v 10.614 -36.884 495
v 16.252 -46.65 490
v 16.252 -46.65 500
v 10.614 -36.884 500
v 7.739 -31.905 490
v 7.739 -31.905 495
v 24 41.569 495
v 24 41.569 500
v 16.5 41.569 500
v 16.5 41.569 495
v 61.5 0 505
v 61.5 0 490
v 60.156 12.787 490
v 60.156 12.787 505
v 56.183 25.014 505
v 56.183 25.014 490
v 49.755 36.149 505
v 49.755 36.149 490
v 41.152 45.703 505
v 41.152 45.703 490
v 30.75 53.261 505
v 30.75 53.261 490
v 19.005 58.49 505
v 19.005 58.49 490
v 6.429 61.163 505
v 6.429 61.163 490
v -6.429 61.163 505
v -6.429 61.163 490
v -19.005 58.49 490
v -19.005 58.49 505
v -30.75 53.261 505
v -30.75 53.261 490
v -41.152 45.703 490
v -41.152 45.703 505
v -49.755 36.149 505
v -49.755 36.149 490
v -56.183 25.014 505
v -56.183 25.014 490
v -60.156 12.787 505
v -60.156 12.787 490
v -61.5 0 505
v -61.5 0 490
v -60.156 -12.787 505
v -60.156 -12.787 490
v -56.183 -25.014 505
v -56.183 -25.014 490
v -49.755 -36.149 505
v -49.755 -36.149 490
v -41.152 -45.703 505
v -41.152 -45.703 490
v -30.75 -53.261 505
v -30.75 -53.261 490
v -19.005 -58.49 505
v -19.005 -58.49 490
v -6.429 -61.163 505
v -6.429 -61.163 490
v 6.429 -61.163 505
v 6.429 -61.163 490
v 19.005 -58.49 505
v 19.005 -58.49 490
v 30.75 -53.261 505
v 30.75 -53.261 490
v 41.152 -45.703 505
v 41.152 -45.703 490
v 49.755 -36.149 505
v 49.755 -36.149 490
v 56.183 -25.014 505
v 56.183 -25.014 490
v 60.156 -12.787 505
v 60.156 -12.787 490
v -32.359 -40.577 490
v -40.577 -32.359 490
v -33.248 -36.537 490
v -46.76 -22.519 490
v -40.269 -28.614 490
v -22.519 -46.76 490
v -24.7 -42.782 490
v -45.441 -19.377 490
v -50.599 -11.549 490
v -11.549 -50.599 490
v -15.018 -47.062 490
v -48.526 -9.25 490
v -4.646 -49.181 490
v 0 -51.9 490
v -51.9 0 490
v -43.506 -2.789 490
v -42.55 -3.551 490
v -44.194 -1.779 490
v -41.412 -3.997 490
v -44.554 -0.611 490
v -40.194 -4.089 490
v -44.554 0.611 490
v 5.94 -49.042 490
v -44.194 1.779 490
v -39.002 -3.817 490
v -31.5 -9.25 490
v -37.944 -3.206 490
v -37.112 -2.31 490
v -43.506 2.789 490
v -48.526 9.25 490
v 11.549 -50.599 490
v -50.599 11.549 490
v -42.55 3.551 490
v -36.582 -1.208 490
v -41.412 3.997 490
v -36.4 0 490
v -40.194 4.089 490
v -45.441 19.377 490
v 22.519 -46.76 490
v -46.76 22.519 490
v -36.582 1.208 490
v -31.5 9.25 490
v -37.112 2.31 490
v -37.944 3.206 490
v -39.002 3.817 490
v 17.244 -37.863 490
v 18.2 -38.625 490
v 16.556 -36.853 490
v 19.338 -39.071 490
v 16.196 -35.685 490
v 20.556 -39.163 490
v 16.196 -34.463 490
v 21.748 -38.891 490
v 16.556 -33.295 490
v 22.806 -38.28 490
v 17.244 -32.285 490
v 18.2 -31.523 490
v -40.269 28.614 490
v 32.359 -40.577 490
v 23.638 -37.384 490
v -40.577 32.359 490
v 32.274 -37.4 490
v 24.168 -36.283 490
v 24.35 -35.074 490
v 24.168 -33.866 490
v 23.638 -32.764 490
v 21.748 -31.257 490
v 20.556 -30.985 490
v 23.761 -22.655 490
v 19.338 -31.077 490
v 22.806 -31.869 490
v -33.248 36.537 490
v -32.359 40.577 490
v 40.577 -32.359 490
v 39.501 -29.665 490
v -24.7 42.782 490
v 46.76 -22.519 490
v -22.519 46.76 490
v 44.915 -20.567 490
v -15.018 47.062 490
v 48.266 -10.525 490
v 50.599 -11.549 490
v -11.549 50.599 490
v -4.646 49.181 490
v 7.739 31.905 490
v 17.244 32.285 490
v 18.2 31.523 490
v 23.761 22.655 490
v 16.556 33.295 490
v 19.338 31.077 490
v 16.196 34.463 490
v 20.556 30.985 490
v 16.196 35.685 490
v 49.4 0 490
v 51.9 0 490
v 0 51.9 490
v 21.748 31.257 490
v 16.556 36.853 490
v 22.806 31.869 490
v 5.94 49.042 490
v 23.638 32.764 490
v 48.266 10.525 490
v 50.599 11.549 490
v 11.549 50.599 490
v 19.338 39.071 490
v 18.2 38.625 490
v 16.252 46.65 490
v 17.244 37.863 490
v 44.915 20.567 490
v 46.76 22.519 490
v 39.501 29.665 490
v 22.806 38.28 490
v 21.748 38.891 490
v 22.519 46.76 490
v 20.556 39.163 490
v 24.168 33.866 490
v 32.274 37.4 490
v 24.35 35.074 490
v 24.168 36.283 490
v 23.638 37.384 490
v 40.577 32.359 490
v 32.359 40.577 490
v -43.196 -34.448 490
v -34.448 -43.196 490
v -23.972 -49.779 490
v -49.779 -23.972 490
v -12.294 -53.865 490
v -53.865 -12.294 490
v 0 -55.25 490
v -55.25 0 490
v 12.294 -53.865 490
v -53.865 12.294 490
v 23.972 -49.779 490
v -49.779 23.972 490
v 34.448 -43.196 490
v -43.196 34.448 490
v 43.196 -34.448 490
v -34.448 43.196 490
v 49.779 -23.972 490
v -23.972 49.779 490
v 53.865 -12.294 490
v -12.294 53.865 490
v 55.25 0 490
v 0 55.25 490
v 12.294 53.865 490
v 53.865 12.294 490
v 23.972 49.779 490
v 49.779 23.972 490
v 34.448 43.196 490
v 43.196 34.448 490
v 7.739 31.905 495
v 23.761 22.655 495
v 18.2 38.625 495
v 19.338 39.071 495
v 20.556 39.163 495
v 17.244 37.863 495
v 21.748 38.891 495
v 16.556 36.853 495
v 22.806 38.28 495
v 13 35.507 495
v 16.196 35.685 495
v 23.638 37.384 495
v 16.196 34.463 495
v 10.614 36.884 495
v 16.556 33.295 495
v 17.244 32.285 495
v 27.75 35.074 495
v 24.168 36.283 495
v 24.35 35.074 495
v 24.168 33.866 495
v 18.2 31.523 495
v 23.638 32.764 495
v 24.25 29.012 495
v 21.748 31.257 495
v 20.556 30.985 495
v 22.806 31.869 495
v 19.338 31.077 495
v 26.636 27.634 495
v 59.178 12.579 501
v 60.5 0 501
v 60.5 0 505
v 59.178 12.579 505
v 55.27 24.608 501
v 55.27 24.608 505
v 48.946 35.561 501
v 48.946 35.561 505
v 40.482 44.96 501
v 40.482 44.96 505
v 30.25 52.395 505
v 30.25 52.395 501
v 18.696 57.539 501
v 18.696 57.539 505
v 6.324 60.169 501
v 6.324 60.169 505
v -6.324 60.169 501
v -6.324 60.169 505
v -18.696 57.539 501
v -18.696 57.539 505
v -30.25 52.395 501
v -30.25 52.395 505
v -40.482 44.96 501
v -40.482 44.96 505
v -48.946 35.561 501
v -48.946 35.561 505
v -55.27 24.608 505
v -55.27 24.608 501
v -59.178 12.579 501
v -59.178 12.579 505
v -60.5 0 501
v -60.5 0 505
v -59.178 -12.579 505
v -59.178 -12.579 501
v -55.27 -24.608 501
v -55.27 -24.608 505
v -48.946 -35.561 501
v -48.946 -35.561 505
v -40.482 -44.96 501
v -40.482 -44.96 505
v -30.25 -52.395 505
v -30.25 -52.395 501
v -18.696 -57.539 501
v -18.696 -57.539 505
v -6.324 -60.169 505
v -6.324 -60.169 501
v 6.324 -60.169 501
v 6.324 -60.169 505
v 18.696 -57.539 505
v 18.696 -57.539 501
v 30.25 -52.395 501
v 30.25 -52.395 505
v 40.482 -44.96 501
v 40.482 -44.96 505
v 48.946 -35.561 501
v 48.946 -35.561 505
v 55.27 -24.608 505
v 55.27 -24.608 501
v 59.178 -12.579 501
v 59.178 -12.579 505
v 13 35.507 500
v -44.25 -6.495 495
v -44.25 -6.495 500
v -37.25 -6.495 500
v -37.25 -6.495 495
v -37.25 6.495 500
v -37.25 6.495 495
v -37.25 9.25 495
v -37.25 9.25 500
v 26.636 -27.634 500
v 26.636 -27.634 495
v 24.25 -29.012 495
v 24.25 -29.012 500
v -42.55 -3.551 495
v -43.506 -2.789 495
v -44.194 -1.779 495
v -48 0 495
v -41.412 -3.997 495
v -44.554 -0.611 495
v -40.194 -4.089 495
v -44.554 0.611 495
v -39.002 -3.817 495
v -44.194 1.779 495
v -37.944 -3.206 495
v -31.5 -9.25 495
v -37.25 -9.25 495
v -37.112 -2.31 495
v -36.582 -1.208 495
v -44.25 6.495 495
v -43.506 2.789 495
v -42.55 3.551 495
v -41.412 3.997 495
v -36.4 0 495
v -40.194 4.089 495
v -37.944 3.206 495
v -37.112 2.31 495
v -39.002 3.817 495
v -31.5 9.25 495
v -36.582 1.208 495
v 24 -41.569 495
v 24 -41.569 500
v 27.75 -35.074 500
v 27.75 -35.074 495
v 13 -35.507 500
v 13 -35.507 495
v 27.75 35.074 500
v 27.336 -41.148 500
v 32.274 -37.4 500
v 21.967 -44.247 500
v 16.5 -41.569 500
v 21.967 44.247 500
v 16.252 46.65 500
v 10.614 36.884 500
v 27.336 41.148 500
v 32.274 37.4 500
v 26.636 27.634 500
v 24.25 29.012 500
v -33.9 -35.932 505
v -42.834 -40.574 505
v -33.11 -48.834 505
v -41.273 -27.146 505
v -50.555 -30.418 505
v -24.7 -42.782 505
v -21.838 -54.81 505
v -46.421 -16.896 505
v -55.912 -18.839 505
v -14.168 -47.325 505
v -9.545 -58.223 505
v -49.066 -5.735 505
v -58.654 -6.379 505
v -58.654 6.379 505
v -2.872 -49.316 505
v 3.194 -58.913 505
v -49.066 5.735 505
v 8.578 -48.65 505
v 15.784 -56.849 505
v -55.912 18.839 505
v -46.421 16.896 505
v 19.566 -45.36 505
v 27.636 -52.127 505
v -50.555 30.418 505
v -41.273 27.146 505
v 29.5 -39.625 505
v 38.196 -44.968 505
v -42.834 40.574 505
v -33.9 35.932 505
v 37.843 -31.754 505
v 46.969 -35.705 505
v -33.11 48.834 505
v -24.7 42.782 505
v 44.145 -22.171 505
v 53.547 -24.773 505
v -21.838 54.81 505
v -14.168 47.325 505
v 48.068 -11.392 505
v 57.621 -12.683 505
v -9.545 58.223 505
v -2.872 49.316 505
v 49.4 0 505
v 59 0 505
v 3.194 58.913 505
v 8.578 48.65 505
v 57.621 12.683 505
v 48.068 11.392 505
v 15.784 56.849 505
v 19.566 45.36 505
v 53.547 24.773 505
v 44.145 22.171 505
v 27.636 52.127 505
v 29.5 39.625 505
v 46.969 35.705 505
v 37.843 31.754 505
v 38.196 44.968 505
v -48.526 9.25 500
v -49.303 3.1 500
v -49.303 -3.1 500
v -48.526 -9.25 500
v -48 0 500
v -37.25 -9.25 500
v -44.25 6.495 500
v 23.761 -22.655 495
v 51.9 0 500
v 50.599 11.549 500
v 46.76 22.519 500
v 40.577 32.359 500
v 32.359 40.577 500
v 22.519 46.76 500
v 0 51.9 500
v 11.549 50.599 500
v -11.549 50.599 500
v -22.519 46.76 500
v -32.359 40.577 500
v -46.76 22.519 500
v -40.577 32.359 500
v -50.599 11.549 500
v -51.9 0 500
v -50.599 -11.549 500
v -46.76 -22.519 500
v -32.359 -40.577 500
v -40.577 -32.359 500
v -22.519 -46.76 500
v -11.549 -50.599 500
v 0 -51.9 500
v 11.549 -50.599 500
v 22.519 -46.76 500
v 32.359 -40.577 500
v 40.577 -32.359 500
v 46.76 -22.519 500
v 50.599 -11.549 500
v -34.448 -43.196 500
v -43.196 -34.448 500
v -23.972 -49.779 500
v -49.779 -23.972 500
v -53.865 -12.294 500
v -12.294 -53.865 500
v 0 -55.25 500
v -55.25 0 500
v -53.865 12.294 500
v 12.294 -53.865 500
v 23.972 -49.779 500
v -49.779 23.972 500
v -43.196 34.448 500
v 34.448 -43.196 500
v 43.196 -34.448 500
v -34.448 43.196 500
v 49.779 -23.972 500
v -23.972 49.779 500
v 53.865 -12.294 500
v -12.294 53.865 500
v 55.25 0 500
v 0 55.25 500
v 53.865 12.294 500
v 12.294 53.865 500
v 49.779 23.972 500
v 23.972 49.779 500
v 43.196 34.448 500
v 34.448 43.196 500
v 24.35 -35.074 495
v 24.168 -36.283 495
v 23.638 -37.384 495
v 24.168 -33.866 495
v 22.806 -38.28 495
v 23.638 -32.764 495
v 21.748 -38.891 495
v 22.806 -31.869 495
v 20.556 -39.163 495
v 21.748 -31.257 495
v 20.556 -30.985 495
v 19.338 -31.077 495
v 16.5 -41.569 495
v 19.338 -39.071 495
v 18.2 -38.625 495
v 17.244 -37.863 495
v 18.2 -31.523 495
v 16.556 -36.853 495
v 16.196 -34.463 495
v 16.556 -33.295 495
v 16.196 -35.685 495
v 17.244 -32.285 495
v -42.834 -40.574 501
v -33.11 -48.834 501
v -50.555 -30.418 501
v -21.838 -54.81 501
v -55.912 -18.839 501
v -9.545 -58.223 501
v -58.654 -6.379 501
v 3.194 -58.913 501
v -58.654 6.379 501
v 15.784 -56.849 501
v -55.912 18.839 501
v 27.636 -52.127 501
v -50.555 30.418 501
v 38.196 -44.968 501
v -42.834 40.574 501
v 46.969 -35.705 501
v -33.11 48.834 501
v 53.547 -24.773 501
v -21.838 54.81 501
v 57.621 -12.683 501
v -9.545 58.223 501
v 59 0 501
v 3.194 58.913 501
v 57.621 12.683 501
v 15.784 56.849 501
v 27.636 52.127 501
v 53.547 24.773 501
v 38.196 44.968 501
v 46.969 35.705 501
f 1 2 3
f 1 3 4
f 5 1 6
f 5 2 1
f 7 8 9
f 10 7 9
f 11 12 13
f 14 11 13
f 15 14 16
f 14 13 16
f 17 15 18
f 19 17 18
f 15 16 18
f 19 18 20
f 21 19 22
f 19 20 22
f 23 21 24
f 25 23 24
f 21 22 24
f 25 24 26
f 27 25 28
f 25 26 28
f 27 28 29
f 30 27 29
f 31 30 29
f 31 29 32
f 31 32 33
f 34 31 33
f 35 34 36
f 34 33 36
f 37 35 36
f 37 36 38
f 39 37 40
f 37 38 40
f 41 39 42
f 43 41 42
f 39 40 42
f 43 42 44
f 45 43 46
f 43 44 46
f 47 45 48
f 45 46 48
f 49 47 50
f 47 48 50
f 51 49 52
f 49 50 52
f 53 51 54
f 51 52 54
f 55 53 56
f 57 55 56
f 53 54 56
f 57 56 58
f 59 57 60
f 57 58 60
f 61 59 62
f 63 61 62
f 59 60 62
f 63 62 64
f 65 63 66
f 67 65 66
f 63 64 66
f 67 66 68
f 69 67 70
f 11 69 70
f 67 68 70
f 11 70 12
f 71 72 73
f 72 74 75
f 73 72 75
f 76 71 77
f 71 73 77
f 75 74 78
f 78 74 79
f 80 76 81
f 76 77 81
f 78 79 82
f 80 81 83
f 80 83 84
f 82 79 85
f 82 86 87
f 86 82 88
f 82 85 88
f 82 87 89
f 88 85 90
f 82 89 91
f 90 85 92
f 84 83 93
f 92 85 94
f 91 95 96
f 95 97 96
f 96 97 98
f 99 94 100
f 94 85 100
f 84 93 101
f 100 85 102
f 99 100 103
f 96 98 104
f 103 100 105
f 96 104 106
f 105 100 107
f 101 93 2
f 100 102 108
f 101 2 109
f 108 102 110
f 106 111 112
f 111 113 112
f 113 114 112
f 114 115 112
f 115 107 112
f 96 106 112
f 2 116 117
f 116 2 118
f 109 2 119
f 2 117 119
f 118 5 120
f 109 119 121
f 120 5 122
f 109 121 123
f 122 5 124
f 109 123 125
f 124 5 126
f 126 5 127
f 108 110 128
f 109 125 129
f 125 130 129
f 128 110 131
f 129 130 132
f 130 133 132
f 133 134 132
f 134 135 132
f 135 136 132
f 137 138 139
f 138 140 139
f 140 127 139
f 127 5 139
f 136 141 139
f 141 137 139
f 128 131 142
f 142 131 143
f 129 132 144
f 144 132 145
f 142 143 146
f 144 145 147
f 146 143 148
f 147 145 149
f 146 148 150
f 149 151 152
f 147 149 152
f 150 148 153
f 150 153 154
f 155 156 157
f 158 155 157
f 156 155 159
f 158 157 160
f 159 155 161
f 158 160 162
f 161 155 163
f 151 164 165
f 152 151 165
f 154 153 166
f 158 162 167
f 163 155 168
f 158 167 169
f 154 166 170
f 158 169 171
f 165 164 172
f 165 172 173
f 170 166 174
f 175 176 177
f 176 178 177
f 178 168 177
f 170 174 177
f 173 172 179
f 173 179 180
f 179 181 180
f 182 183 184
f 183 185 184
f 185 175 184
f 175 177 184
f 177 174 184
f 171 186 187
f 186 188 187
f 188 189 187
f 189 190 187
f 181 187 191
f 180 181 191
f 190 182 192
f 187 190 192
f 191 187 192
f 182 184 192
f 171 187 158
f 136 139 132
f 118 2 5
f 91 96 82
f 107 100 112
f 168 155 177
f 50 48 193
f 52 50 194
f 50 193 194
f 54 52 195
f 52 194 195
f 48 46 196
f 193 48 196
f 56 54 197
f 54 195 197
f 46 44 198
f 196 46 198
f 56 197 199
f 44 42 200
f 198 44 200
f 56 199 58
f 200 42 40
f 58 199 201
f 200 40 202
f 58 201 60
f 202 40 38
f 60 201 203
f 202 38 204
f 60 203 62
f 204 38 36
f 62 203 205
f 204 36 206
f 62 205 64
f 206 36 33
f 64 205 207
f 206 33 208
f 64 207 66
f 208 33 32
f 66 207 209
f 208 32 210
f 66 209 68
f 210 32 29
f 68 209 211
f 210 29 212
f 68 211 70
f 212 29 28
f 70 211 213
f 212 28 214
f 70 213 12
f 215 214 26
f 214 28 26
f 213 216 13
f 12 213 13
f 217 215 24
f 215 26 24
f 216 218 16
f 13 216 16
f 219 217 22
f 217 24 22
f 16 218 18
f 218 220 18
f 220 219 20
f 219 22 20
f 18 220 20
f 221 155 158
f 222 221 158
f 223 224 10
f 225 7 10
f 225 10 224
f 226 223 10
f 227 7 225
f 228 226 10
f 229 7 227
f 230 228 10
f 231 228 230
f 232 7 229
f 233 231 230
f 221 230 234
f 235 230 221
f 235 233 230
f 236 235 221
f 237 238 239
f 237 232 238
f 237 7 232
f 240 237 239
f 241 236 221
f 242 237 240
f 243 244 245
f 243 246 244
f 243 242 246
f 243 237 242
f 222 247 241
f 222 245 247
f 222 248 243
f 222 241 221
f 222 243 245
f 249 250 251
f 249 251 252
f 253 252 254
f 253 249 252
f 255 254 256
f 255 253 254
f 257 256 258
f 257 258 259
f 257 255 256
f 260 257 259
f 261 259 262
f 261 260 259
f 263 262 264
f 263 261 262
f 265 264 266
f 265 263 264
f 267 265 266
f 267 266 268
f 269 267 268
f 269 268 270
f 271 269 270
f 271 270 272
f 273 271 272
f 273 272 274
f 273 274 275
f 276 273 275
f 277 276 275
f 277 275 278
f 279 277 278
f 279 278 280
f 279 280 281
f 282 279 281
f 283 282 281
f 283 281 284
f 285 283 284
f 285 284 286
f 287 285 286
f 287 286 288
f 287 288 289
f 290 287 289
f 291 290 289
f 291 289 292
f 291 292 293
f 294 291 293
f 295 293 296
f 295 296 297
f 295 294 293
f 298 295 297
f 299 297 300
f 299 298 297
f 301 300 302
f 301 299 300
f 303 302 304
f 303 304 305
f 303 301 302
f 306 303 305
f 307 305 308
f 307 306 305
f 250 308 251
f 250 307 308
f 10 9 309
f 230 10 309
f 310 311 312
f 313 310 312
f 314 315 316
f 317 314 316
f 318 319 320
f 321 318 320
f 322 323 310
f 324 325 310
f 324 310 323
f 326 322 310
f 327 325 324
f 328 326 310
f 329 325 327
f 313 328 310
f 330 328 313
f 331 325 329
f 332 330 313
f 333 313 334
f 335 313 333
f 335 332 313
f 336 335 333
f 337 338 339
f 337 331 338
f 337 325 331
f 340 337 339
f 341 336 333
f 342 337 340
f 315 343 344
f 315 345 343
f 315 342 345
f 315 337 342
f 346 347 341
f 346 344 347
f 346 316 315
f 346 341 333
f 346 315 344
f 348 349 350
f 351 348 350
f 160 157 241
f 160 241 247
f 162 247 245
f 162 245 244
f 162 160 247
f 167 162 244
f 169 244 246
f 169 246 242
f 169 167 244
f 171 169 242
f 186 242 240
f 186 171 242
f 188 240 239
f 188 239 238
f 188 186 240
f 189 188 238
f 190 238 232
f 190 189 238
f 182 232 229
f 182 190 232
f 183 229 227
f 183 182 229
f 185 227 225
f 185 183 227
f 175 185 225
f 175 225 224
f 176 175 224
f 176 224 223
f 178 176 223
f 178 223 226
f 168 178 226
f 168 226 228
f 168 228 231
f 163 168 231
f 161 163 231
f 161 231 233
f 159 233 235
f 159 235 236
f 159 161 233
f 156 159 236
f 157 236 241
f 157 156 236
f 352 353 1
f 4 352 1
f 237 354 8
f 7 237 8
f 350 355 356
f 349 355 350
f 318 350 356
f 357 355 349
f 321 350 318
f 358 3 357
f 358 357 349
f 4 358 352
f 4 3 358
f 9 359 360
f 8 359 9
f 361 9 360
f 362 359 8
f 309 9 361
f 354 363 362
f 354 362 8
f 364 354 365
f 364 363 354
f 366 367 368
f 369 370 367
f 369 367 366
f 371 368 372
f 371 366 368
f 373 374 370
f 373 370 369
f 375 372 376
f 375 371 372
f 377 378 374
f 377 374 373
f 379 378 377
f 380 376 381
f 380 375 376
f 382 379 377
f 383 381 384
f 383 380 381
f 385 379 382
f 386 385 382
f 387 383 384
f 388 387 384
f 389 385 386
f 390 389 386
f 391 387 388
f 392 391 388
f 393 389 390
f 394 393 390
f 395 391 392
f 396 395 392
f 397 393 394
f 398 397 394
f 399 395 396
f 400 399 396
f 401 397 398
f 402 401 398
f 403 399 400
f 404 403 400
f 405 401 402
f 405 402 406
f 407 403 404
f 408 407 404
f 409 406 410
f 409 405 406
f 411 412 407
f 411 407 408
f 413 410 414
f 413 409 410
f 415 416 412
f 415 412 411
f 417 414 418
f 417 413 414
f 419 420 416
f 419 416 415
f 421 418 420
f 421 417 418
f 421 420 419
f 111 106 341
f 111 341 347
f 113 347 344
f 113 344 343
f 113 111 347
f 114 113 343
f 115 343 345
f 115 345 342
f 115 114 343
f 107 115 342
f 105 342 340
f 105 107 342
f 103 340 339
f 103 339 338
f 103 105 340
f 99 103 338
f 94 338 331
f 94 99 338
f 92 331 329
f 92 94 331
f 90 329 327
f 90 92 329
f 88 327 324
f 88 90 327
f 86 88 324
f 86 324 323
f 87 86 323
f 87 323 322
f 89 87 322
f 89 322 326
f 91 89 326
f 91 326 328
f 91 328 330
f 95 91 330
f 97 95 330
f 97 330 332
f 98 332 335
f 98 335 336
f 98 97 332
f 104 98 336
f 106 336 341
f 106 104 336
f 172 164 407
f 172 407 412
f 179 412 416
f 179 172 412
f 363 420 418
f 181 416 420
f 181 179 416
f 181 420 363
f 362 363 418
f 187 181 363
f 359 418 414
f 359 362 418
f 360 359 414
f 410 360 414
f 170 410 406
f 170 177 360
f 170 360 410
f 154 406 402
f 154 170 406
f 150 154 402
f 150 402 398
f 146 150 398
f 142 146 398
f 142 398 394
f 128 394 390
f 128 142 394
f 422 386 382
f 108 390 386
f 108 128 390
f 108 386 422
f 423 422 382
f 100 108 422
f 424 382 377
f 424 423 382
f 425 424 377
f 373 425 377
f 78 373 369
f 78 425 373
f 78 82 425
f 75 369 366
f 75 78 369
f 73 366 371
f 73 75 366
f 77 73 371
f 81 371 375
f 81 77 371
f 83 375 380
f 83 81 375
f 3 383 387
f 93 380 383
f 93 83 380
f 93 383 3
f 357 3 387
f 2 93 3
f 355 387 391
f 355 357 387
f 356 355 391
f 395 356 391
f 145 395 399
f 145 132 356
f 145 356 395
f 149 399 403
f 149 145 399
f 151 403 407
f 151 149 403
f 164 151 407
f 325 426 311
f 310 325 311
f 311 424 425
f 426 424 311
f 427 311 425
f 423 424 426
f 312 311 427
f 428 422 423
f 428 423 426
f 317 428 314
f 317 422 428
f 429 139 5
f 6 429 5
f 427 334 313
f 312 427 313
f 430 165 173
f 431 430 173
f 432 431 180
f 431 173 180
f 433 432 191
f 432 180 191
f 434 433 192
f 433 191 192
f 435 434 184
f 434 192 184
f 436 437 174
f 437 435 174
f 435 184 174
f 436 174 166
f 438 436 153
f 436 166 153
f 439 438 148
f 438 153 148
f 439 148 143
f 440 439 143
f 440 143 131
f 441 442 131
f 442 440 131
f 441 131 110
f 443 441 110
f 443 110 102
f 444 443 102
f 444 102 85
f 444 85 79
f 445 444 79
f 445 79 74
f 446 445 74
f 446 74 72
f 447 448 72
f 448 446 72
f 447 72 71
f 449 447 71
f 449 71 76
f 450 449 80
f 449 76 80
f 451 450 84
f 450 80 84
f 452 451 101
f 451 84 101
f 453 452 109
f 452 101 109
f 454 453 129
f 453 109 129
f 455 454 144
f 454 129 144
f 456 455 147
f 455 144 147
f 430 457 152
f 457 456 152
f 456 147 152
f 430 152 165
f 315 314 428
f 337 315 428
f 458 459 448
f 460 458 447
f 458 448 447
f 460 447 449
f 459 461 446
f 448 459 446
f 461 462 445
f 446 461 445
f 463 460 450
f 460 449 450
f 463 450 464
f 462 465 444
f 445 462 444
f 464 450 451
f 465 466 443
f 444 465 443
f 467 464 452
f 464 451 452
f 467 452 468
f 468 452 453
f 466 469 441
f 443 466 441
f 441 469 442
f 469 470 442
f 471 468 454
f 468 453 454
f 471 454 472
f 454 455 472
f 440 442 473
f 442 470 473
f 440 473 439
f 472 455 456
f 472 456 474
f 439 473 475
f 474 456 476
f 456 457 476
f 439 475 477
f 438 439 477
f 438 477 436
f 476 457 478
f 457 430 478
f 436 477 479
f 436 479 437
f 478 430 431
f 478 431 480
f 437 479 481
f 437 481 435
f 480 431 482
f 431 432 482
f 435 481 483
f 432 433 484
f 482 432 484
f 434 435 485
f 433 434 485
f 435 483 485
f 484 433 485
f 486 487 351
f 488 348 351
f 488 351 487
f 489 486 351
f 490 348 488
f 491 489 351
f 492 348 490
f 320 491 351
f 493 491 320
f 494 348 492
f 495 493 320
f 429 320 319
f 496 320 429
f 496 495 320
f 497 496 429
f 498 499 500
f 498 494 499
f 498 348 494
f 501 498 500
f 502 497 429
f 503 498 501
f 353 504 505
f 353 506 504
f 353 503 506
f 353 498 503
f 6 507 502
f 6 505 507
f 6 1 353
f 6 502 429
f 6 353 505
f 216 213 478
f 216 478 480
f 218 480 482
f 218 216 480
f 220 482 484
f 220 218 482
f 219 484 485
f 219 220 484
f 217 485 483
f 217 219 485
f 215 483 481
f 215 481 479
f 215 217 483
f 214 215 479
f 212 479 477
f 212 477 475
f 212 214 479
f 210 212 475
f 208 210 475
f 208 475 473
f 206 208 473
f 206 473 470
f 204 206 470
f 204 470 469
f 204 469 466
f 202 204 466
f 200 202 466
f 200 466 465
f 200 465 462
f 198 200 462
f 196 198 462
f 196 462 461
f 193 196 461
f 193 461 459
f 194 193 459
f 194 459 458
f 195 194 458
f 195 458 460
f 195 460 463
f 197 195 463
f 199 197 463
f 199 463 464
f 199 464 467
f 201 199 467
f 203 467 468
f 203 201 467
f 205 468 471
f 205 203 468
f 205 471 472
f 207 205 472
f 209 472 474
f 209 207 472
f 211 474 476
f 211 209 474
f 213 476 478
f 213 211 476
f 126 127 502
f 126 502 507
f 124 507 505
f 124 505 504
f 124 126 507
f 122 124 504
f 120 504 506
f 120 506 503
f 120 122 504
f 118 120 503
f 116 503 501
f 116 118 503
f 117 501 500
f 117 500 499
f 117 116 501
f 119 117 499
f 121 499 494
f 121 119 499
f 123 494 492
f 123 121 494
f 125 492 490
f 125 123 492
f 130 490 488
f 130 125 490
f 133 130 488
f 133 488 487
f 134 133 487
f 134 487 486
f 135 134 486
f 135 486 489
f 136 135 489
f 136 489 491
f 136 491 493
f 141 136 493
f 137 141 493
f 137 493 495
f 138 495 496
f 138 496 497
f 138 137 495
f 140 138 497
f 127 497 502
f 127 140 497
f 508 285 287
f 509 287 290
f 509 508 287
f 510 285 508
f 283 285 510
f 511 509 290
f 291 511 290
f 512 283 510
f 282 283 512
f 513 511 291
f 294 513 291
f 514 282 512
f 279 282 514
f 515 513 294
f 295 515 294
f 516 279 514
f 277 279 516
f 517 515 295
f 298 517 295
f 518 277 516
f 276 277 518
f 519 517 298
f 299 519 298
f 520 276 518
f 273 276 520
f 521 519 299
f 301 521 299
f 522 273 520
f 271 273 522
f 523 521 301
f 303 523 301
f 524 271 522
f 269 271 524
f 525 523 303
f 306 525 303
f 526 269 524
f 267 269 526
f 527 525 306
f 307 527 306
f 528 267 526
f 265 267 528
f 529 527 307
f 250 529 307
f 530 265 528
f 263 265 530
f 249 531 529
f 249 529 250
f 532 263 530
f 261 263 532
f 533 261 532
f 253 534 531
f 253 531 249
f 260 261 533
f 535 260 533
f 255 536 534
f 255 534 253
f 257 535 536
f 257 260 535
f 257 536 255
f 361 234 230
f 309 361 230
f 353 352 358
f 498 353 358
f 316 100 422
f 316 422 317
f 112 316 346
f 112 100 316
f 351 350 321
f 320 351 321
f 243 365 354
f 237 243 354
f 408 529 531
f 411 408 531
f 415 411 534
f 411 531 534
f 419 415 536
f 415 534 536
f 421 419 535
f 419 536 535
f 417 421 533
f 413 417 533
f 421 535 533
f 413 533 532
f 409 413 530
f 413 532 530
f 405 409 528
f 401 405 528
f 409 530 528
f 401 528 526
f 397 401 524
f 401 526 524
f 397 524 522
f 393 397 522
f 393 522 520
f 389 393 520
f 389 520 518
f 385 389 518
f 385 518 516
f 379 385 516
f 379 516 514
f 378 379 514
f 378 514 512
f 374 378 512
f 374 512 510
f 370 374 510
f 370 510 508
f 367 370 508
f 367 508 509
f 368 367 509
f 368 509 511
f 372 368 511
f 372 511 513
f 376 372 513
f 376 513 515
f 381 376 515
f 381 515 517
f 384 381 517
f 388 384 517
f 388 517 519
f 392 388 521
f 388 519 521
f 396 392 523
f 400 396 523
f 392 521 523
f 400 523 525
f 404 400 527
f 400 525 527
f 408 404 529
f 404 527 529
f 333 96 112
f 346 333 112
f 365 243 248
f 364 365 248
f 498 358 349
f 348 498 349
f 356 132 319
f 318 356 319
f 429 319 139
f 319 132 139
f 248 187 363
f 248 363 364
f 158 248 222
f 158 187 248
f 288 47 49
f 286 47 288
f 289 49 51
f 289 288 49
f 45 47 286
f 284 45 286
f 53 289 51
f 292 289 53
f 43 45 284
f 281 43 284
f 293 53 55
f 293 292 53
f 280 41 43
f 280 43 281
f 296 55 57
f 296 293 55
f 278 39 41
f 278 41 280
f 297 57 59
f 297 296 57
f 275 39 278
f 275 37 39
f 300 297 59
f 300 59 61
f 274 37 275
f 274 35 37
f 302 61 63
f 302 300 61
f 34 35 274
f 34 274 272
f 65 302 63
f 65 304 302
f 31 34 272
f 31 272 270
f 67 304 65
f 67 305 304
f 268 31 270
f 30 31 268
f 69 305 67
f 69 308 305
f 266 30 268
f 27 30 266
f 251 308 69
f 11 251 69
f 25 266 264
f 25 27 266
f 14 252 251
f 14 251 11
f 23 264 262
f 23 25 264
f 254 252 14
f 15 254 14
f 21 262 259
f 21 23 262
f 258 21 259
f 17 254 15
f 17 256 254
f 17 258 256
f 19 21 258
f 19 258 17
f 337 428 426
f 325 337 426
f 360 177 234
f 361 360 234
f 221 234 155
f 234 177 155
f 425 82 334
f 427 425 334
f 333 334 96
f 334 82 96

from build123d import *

# Parameters (mm, degrees)
EXTRUDE003_DEPTH  = 5
BOX025_W          = 13.75
BOX025_H          = 18.5
BOX025_DEPTH      = 5
CYLINDER031_R     = 4.1
CYLINDER031_DEPTH = 5
BOX024_W          = 18
BOX024_H          = 18.5
BOX024_DEPTH      = 5
ARRAY035_COUNT    = 3
TUBE016_R         = 60.5
TUBE016_R_2       = 59
TUBE016_DEPTH     = 11
TUBE017_R         = 61.5
TUBE017_R_2       = 60.5
TUBE017_DEPTH     = 15
TUBE024_R         = 55.25
TUBE024_R_2       = 51.75
TUBE024_DEPTH     = 5
TUBE025_R         = 51.9
TUBE025_R_2       = 49.4
TUBE025_DEPTH     = 15
TUBE015_R         = 59
TUBE015_R_2       = 55.25
TUBE015_DEPTH     = 15


with BuildPart() as cockpitrailconnectornutcutout:
    # Face003 → Extrude003 (new body)
    with BuildSketch(Plane(origin=(-40.5, 0, 500), x_dir=(0, 1, 0), z_dir=(0, 0, 1))):
        Polygon((0, -7.5), (6.495191, -3.75), (6.495191, 3.75), (0, 7.5), (-6.495191, 3.75), (-6.495191, -3.75), align=None)
    extrude(amount=-EXTRUDE003_DEPTH)


with BuildPart() as cockpitrailconnectornutanchor1:
    # Box025 → Box025 (new body)
    with BuildSketch(Plane(origin=(-51, -9.25, 495), x_dir=(1, 0, 0), z_dir=(0, 0, 1))):
        with Locations((6.875, 9.25)):
            Rectangle(BOX025_W, BOX025_H)
    extrude(amount=BOX025_DEPTH)

    # Cut059: cut CockpitRailConnectorNutCutout
    add(cockpitrailconnectornutcutout.part, mode=Mode.SUBTRACT)


with BuildPart() as cockpitrailconnectorrailcutter:
    # Cylinder031 → Cylinder031 (new body)
    with BuildSketch(Plane(origin=(-40.5, 0, 490), x_dir=(1, 0, 0), z_dir=(0, 0, 1))):
        Circle(CYLINDER031_R)
    extrude(amount=CYLINDER031_DEPTH)


with BuildPart() as cockpitrailconnectors:
    # Box024 → Box024 (new body)
    with BuildSketch(Plane(origin=(-49.5, -9.25, 490), x_dir=(1, 0, 0), z_dir=(0, 0, 1))):
        with Locations((9, 9.25)):
            Rectangle(BOX024_W, BOX024_H)
    extrude(amount=BOX024_DEPTH)

    # Cut058: cut CockpitRailConnectorRailCutter
    add(cockpitrailconnectorrailcutter.part, mode=Mode.SUBTRACT)

    # Fusion018: union CockpitRailConnectorNutAnchor1
    add(cockpitrailconnectornutanchor1.part)

    # Array035: CockpitRailConnectors ×3 about axis
    array035_axis = Axis((0, 0, 0), (0, 0, 1))


with BuildPart() as cockpitrailconnectors_1:
    add(cockpitrailconnectors.part)
    for i in range(1, ARRAY035_COUNT):
        add(cockpitrailconnectors.part.rotate(array035_axis, i * 360 / ARRAY035_COUNT))


with BuildPart() as cockpitmountcenter:
    # Tube016 → Tube016 (new body)
    with BuildSketch(Plane.XY):
        Circle(TUBE016_R)
        Circle(TUBE016_R_2, mode=Mode.SUBTRACT)
    extrude(amount=TUBE016_DEPTH)


with BuildPart() as cockpitmountouter:
    # Tube017 → Tube017 (new body)
    with BuildSketch(Plane.XY):
        Circle(TUBE017_R)
        Circle(TUBE017_R_2, mode=Mode.SUBTRACT)
    extrude(amount=TUBE017_DEPTH)


with BuildPart() as cockpitconnectorcenter:
    # Tube024 → Tube024 (new body)
    with BuildSketch(Plane.XY.offset(10)):
        Circle(TUBE024_R)
        Circle(TUBE024_R_2, mode=Mode.SUBTRACT)
    extrude(amount=TUBE024_DEPTH)


with BuildPart() as cockpitconnectorinner:
    # Tube025 → Tube025 (new body)
    with BuildSketch(Plane.XY):
        Circle(TUBE025_R)
        Circle(TUBE025_R_2, mode=Mode.SUBTRACT)
    extrude(amount=TUBE025_DEPTH)


with BuildPart() as cockpitglassmount2:
    # Tube015 → Tube015 (new body)
    with BuildSketch(Plane.XY):
        Circle(TUBE015_R)
        Circle(TUBE015_R_2, mode=Mode.SUBTRACT)
    extrude(amount=TUBE015_DEPTH)

    # Fusion007: union CockpitMountCenter, CockpitMountOuter, CockpitConnectorCenter, CockpitConnectorInner
    add(cockpitmountcenter.part)
    add(cockpitmountouter.part)
    add(cockpitconnectorcenter.part)
    add(cockpitconnectorinner.part)


with BuildPart() as cockpitglassmount2_1:
    # Fusion007 placement: moved
    add(cockpitglassmount2.part.moved(Location((0, 0, 490))))

    # Fusion019: union CockpitRailConnectors
    add(cockpitrailconnectors_1.part)


solid = cockpitglassmount2_1.part
